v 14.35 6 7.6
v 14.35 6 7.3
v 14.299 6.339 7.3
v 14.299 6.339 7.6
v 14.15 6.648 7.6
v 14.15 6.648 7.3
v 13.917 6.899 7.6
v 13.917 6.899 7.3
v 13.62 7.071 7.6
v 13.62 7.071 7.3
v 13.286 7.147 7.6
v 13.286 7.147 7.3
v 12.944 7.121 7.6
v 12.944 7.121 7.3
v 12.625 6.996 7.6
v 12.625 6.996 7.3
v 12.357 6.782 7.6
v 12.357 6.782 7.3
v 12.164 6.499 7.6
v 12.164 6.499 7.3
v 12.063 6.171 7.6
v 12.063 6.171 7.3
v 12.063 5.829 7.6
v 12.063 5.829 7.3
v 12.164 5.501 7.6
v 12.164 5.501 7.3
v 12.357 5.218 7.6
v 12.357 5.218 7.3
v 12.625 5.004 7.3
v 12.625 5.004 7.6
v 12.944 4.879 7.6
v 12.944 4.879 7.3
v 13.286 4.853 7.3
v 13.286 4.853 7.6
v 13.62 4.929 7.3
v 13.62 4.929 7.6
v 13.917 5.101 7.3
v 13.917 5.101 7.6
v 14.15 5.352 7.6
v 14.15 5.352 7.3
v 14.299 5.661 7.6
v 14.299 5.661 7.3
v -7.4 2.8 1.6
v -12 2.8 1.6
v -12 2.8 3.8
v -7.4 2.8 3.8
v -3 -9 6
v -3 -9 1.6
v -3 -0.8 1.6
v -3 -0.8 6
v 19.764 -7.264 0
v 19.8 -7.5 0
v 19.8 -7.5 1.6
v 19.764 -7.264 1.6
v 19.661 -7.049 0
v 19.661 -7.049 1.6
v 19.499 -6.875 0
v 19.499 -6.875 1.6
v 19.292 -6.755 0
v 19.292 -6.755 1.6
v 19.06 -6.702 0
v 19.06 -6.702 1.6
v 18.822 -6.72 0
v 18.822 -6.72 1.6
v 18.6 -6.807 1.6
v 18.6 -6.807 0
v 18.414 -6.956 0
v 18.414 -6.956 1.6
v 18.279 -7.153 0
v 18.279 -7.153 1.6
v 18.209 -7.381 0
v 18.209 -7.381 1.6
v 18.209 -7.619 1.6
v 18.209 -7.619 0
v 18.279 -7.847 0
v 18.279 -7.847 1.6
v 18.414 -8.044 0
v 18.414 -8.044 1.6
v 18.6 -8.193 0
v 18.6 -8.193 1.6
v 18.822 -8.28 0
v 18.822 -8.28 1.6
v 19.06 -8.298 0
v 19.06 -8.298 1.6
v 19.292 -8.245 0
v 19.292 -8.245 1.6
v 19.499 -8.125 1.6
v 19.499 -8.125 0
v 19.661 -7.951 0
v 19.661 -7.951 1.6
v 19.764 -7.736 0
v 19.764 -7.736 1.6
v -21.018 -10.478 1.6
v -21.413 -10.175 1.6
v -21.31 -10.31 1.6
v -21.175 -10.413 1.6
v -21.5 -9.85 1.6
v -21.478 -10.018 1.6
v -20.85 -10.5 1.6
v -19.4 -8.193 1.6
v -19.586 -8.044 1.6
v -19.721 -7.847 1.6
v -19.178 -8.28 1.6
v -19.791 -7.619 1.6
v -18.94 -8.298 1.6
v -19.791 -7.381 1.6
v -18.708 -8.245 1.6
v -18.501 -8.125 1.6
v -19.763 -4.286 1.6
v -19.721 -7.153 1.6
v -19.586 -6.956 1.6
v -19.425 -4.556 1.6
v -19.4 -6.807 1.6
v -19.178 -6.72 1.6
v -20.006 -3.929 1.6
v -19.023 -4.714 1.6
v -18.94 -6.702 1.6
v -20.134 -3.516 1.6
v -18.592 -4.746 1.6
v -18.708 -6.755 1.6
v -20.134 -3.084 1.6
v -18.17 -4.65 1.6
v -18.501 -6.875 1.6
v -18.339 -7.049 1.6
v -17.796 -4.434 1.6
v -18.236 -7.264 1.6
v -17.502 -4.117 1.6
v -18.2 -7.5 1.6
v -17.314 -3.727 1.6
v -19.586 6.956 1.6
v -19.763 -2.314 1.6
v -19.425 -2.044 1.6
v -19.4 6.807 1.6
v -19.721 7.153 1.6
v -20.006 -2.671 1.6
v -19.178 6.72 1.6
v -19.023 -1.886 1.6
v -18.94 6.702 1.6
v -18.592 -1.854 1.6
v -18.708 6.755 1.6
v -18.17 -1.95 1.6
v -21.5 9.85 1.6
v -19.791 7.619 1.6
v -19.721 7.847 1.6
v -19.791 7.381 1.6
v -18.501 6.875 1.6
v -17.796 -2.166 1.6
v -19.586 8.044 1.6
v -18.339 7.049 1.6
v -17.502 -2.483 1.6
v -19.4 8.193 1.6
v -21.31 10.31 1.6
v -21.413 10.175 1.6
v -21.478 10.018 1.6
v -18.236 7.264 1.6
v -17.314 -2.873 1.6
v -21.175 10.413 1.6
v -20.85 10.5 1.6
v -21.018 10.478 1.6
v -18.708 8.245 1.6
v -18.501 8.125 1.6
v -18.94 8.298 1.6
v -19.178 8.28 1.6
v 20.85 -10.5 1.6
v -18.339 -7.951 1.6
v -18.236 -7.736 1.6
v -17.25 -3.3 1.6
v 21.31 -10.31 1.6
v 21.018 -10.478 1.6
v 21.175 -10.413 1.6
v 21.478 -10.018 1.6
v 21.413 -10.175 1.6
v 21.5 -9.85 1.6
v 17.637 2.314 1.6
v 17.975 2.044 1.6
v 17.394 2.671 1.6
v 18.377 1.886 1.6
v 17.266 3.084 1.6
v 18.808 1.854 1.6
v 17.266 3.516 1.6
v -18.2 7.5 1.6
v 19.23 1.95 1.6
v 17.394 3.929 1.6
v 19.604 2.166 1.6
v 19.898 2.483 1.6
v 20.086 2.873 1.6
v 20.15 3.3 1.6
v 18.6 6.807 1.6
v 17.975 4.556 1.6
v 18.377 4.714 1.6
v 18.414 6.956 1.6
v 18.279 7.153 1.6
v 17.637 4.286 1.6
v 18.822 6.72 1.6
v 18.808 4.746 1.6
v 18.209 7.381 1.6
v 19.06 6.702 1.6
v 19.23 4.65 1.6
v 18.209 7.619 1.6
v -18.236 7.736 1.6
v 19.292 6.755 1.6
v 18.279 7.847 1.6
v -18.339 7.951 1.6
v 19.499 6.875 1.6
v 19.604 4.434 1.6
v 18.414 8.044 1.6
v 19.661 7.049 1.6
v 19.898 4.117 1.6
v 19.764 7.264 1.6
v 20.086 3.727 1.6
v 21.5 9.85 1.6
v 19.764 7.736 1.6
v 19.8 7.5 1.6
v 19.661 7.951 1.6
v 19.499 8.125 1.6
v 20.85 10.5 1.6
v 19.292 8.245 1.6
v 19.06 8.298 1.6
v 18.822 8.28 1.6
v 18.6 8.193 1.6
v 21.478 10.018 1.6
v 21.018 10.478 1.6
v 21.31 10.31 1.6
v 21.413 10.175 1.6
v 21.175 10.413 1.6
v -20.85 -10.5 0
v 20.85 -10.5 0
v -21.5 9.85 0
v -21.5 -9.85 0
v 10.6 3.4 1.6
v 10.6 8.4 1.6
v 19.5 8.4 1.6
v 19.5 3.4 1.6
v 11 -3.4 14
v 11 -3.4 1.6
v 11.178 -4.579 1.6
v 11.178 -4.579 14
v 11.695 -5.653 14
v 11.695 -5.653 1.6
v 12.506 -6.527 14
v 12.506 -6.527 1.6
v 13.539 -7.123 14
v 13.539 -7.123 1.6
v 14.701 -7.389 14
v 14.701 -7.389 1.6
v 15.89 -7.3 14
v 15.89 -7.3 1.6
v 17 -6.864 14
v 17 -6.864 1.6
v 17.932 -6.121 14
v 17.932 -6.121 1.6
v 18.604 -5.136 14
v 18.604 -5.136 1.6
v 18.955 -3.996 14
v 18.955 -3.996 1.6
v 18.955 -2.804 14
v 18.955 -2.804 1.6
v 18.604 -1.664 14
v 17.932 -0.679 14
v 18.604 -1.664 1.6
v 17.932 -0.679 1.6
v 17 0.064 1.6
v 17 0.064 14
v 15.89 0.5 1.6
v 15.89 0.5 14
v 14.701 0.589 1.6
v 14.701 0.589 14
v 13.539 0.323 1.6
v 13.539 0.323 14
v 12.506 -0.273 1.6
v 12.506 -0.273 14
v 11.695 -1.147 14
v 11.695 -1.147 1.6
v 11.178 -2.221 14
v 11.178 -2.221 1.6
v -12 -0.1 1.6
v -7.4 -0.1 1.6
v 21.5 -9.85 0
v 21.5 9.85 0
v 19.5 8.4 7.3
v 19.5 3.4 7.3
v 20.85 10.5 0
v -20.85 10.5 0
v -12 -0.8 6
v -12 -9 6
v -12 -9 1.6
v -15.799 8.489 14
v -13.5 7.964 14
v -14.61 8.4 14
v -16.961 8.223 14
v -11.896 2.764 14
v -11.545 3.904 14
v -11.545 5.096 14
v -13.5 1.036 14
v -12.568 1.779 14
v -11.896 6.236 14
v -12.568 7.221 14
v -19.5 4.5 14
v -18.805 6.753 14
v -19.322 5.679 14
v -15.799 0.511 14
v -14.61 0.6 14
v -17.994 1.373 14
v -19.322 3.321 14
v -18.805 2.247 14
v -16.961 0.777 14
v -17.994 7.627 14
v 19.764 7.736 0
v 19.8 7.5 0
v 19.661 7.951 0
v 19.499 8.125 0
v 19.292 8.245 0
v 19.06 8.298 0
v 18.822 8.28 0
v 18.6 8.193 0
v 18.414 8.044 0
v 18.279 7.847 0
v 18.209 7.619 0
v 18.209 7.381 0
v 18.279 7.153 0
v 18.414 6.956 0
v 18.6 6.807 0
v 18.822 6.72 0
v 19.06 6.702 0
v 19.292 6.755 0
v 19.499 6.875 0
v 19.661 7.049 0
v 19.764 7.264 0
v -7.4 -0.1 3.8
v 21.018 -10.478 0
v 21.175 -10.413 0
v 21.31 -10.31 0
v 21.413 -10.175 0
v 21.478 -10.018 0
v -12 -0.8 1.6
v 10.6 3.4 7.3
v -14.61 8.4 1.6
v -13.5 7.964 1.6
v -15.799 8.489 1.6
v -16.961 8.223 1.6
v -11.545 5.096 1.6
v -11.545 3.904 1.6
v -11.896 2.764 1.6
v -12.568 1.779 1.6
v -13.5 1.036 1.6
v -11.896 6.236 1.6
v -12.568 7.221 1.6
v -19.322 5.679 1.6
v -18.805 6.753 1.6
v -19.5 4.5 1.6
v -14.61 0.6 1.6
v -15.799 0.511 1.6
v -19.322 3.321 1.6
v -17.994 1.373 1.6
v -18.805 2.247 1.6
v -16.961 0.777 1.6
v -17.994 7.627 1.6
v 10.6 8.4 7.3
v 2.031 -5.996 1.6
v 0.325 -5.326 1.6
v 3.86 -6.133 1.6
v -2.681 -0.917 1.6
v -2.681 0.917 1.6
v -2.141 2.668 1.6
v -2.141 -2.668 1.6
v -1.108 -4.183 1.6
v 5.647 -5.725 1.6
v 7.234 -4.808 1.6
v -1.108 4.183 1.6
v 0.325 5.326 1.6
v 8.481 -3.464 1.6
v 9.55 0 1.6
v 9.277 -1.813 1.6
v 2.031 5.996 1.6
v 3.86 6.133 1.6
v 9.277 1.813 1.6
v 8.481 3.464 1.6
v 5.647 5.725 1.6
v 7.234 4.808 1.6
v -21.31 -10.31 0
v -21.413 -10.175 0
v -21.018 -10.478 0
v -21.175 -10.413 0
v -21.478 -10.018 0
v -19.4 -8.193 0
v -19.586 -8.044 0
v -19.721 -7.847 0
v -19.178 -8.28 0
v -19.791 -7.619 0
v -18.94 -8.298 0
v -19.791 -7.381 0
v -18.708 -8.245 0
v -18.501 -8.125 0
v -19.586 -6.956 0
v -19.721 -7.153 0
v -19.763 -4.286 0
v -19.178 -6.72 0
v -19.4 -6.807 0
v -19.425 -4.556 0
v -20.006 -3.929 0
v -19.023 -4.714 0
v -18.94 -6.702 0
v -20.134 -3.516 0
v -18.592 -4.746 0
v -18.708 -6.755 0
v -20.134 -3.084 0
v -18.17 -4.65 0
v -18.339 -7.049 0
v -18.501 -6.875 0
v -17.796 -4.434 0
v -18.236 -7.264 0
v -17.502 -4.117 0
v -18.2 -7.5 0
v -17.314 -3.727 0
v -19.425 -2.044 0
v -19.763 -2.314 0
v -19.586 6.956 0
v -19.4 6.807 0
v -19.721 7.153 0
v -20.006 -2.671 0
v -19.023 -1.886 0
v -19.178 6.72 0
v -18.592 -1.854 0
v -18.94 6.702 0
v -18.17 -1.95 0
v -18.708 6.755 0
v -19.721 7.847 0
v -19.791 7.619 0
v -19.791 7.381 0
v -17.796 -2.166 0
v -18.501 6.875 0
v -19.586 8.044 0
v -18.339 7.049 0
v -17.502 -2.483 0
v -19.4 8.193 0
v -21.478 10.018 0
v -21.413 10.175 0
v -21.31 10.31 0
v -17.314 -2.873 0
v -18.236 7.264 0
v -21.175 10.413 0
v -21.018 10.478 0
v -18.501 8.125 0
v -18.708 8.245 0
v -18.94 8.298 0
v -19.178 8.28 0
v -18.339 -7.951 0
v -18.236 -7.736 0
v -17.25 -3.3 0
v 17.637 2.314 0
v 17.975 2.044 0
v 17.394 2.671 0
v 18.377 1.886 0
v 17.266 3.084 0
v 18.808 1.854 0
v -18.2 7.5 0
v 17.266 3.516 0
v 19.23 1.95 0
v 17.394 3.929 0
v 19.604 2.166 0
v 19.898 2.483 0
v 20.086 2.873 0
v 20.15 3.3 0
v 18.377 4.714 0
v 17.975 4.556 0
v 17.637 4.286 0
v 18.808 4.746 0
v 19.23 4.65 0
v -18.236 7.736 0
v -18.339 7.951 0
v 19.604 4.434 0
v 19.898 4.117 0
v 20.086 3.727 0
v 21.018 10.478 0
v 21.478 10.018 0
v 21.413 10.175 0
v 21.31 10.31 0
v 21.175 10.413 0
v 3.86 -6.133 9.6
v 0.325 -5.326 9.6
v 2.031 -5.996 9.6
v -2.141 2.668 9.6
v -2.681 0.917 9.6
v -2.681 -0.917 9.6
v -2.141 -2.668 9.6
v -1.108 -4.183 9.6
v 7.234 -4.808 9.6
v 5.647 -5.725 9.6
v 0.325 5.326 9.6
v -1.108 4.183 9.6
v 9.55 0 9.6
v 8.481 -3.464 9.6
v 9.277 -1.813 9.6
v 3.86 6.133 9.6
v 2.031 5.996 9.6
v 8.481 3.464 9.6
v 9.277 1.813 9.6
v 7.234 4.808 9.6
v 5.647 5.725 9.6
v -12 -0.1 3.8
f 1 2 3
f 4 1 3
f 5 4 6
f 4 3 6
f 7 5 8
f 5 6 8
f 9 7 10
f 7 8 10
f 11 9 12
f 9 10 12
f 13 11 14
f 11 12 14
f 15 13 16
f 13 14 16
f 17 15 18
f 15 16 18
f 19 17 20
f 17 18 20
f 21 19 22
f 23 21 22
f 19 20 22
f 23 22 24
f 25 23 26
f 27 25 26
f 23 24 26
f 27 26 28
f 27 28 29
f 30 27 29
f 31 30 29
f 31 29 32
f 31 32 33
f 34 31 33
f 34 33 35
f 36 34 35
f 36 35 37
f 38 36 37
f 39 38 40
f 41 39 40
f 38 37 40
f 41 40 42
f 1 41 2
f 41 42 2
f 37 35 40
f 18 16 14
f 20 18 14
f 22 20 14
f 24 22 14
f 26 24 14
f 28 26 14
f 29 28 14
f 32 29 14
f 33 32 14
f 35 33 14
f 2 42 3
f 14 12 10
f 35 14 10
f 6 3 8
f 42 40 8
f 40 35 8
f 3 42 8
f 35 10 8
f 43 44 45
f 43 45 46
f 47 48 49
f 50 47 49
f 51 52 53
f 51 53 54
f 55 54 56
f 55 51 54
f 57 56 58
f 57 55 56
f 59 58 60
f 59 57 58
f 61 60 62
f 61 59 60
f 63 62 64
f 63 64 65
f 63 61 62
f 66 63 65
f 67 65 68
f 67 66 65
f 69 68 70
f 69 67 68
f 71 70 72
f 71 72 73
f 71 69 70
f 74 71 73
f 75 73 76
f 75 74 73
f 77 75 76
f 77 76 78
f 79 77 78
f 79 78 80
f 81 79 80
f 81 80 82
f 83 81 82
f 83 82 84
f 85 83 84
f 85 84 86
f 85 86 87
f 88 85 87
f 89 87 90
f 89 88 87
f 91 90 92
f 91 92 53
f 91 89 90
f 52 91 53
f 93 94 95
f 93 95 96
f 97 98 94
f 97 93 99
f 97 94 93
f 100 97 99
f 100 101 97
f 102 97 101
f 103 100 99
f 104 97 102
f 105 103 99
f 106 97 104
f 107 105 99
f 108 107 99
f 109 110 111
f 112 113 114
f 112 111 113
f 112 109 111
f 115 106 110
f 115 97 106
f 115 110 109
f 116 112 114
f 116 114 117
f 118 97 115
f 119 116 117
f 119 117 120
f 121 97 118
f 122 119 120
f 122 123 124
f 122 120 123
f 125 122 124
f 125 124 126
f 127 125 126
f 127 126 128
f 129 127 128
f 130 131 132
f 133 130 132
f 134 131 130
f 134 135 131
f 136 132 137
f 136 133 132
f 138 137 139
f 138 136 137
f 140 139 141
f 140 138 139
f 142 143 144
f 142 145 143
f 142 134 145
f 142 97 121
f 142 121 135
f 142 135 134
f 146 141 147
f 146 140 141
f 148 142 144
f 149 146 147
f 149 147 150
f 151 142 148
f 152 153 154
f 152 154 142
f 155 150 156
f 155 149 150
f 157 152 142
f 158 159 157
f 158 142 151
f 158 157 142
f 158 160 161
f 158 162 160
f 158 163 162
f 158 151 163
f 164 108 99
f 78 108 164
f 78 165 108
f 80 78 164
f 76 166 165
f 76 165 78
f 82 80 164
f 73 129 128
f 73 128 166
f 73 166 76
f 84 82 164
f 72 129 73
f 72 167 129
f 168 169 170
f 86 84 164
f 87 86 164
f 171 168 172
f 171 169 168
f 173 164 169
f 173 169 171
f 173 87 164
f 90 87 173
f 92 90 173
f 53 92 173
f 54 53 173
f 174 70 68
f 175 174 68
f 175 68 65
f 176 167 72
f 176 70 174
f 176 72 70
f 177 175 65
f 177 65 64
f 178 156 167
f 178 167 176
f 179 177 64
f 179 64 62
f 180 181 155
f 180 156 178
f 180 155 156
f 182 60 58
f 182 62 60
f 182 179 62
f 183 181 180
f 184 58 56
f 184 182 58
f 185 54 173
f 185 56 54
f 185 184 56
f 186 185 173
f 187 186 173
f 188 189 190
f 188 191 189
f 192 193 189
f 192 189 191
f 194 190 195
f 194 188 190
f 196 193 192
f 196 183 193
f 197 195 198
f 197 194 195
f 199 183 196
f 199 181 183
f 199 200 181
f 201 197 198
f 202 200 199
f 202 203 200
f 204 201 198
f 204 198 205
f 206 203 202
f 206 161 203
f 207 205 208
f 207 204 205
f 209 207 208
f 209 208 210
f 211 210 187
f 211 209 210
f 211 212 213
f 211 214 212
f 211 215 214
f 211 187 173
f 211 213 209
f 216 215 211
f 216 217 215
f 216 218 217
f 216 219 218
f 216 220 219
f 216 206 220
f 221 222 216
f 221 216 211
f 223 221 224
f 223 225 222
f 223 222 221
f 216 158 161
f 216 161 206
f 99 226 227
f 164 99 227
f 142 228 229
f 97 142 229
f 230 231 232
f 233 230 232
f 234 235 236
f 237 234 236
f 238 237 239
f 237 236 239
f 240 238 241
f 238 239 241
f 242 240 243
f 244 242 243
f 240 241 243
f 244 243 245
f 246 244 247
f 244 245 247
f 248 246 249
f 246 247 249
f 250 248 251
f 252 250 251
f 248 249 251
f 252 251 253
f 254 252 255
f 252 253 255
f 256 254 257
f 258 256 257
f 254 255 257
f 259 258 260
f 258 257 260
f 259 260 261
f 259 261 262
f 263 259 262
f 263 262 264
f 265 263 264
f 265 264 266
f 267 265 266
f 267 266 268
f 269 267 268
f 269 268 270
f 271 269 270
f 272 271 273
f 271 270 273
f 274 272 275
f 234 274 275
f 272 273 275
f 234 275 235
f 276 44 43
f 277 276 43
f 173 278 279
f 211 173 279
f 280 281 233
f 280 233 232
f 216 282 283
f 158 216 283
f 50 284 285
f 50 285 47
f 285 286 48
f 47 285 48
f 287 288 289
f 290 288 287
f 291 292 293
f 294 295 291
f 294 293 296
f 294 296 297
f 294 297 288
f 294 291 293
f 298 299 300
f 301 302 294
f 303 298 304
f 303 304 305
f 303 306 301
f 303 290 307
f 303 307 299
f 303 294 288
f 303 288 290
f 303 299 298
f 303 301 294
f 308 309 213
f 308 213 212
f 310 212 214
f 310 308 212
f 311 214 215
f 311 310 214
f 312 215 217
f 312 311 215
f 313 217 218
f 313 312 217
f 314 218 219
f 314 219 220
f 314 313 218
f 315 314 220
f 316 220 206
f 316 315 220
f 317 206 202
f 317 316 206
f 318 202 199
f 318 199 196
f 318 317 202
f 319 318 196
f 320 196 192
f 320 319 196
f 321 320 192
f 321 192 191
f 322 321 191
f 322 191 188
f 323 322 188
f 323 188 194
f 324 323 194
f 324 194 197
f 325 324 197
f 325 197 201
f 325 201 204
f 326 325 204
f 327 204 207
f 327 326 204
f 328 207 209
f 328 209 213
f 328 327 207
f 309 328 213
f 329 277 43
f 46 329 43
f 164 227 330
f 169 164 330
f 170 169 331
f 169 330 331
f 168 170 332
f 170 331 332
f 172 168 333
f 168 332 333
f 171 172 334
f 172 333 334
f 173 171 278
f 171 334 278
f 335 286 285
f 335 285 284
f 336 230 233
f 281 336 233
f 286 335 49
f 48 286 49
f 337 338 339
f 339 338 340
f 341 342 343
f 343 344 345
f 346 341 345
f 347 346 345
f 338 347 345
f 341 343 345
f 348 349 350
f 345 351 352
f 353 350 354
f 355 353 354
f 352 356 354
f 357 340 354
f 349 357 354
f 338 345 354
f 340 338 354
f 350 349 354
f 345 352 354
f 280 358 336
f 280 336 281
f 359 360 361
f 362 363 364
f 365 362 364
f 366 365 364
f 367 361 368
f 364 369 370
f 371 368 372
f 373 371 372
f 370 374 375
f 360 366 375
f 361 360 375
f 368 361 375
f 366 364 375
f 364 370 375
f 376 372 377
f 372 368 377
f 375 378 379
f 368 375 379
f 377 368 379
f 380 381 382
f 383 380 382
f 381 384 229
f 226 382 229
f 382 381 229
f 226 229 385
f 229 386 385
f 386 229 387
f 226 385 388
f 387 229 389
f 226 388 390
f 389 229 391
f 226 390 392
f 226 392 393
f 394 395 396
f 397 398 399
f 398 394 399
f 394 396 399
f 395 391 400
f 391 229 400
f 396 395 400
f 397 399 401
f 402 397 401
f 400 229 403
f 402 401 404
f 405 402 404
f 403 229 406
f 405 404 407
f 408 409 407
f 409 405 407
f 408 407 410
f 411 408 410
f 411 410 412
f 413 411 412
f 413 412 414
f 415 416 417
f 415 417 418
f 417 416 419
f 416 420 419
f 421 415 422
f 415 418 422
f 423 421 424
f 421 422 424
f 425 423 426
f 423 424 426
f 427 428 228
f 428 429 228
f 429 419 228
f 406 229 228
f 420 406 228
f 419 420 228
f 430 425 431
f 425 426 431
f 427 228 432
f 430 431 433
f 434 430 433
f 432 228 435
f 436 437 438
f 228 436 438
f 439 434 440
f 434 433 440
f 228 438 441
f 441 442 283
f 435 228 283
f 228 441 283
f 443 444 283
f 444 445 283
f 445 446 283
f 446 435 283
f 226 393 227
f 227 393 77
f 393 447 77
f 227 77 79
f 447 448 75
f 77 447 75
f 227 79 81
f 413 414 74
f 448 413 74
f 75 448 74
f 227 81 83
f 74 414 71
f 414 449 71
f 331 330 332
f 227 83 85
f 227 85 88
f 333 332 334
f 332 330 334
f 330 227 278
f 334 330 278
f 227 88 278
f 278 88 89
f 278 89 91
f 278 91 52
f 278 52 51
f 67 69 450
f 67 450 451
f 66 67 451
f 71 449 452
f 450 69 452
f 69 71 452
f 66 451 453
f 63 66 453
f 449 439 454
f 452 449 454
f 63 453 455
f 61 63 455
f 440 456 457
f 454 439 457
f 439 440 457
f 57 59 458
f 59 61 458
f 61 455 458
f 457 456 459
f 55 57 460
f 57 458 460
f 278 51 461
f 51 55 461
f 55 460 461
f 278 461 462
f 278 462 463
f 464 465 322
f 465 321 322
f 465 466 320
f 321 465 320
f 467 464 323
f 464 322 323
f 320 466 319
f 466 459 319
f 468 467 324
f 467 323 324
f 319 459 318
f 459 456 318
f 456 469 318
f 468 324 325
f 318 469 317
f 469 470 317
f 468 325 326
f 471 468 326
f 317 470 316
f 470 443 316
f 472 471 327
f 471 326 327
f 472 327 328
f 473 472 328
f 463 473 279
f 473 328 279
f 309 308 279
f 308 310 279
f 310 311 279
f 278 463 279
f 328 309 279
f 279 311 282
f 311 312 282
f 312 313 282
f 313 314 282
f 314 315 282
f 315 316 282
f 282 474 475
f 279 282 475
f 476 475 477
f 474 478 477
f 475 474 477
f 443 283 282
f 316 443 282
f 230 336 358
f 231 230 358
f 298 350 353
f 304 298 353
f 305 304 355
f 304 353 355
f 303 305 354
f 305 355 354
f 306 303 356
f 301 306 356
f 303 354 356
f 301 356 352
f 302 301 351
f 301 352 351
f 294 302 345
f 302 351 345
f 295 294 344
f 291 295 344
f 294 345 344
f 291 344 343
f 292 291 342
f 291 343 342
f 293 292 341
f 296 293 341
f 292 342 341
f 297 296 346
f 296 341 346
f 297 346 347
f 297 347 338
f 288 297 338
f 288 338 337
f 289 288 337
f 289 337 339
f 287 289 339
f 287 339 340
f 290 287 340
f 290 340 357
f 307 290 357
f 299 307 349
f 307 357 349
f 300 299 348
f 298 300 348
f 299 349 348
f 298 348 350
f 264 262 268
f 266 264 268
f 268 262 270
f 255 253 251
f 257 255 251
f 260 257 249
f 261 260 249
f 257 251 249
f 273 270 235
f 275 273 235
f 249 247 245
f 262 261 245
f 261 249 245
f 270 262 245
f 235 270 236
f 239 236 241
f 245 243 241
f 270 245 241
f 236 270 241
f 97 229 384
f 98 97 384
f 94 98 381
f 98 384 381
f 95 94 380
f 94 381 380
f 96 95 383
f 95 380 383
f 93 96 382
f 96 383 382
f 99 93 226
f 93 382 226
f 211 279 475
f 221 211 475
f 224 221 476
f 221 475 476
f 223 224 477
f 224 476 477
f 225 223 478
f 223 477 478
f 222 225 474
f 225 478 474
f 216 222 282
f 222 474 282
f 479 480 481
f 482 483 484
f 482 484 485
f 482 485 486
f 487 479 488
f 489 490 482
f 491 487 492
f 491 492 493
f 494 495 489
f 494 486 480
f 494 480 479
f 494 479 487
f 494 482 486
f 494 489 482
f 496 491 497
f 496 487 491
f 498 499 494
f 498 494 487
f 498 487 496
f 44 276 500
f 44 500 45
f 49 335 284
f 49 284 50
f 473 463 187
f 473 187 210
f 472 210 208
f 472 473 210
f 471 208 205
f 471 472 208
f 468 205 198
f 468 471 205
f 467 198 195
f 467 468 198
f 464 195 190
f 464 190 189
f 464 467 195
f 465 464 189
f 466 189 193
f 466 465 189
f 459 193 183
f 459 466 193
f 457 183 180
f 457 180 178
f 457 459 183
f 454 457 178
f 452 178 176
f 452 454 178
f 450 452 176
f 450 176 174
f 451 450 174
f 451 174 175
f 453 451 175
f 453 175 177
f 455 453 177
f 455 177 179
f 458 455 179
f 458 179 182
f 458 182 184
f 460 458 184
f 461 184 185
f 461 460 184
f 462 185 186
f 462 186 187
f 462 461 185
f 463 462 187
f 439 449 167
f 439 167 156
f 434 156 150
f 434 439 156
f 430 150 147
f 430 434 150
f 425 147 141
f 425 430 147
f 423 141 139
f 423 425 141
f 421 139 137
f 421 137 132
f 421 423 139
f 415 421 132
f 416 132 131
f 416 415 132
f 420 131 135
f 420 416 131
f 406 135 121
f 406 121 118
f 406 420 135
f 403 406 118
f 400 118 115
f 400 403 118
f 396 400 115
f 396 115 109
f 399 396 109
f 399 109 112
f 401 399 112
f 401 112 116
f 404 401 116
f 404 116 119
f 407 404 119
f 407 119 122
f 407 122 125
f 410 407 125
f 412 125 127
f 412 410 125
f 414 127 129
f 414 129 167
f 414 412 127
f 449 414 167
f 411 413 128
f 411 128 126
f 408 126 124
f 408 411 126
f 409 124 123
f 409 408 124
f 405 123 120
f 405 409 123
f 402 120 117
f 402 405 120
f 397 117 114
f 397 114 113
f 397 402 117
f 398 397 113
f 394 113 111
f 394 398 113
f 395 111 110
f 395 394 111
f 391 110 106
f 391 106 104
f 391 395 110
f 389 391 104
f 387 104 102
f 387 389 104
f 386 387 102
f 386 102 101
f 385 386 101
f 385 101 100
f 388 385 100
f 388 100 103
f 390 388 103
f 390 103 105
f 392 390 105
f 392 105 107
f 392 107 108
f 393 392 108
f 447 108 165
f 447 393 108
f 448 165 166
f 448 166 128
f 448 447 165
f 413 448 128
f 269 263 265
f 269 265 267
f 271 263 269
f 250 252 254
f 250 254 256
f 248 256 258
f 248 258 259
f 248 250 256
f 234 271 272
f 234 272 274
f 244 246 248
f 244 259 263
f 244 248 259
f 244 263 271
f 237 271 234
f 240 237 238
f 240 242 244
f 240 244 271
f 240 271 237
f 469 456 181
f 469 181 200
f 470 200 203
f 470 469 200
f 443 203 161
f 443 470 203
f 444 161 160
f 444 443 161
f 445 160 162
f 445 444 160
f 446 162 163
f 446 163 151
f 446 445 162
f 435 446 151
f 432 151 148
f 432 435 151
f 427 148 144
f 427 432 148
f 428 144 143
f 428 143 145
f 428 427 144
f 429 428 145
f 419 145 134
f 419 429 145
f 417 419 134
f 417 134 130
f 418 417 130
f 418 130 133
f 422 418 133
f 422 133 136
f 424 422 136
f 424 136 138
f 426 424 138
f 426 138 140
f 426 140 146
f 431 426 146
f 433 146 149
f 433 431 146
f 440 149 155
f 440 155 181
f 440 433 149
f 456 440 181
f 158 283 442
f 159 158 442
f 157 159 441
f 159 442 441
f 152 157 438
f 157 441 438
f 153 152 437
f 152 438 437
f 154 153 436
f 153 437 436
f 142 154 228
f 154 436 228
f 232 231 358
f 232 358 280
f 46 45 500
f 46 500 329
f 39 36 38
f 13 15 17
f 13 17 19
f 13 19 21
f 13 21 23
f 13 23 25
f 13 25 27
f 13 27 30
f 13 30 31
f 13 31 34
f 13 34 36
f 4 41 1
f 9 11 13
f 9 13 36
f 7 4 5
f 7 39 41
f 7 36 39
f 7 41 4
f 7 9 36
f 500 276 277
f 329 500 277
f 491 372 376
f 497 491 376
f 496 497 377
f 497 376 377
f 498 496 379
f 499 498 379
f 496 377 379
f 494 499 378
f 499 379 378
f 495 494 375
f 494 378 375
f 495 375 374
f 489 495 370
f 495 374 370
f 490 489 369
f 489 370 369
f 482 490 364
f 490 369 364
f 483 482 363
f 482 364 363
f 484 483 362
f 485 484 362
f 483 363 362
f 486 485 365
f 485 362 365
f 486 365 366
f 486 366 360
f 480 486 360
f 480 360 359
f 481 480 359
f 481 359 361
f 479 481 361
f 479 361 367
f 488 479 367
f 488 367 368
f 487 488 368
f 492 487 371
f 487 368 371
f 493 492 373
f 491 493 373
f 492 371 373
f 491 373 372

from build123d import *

# Parameters (mm, degrees)
PCB_43X21X1P6_SKETCH_R     = 0.8
PCB_43X21X1P6_SKETCH_R_2   = 1.45
PCB_43X21X1P6_DEPTH        = 1.6
LM2596S_TO263_START        = 1.6
LM2596S_TO263_SKETCH_W     = 9
LM2596S_TO263_SKETCH_H     = 8.2
LM2596S_TO263_DEPTH        = 4.4
TRIM_POT_START             = 1.6
TRIM_POT_SKETCH_W          = 8.9
TRIM_POT_SKETCH_H          = 5
TRIM_POT_DEPTH             = 5.7
TRIM_ADJUST_START          = 7.3
TRIM_ADJUST_SKETCH_R       = 1.15
TRIM_ADJUST_DEPTH          = 0.3
SHIELDED_INDUCTOR_START    = 1.6
SHIELDED_INDUCTOR_SKETCH_R = 6.15
SHIELDED_INDUCTOR_DEPTH    = 8
INPUT_CAPACITOR_START      = 1.6
INPUT_CAPACITOR_SKETCH_R   = 4
INPUT_CAPACITOR_DEPTH      = 12.4
OUTPUT_CAPACITOR_START     = 1.6
OUTPUT_CAPACITOR_SKETCH_R  = 4
OUTPUT_CAPACITOR_DEPTH     = 12.4
SCHOTTKY_DIODE_START       = 1.6
SCHOTTKY_DIODE_SKETCH_W    = 4.6
SCHOTTKY_DIODE_SKETCH_H    = 2.9
SCHOTTKY_DIODE_DEPTH       = 2.2


with BuildPart() as part:
    # PCB_43x21x1p6_Sketch → PCB_43x21x1p6 (new body)
    with BuildSketch(Plane.XY):
        with BuildLine():
            Line((-20.85, -10.5), (20.85, -10.5))
            ThreePointArc((20.85, -10.5), (21.309619408, -10.309619408), (21.5, -9.85))
            Line((21.5, -9.85), (21.5, 9.85))
            ThreePointArc((21.5, 9.85), (21.309619408, 10.309619408), (20.85, 10.5))
            Line((20.85, 10.5), (-20.85, 10.5))
            ThreePointArc((-20.85, 10.5), (-21.309619408, 10.309619408), (-21.5, 9.85))
            Line((-21.5, 9.85), (-21.5, -9.85))
            ThreePointArc((-21.5, -9.85), (-21.309619408, -10.309619408), (-20.85, -10.5))
        make_face()
        with Locations((-19, -7.5)):
            Circle(PCB_43X21X1P6_SKETCH_R, mode=Mode.SUBTRACT)
        with Locations((-19, 7.5)):
            Circle(PCB_43X21X1P6_SKETCH_R, mode=Mode.SUBTRACT)
        with Locations((19, -7.5)):
            Circle(PCB_43X21X1P6_SKETCH_R, mode=Mode.SUBTRACT)
        with Locations((19, 7.5)):
            Circle(PCB_43X21X1P6_SKETCH_R, mode=Mode.SUBTRACT)
        with Locations((-18.7, -3.3)):
            Circle(PCB_43X21X1P6_SKETCH_R_2, mode=Mode.SUBTRACT)
        with Locations((18.7, 3.3)):
            Circle(PCB_43X21X1P6_SKETCH_R_2, mode=Mode.SUBTRACT)
    extrude(amount=PCB_43X21X1P6_DEPTH)


with BuildPart() as body_2:
    # LM2596S_TO263_Sketch → LM2596S_TO263 (new body)
    with BuildSketch(Plane.XY.offset(LM2596S_TO263_START)):
        with Locations((-7.5, -4.9)):
            Rectangle(LM2596S_TO263_SKETCH_W, LM2596S_TO263_SKETCH_H)
    extrude(amount=LM2596S_TO263_DEPTH)


with BuildPart() as body_3:
    # Trim_pot_Sketch → Trim_pot (new body)
    with BuildSketch(Plane.XY.offset(TRIM_POT_START)):
        with Locations((15.05, 5.9)):
            Rectangle(TRIM_POT_SKETCH_W, TRIM_POT_SKETCH_H)
    extrude(amount=TRIM_POT_DEPTH)


with BuildPart() as body_4:
    # Trim_Adjust_Sketch → Trim_Adjust (new body)
    with BuildSketch(Plane.XY.offset(TRIM_ADJUST_START)):
        with Locations((13.2, 6)):
            Circle(TRIM_ADJUST_SKETCH_R)
    extrude(amount=TRIM_ADJUST_DEPTH)


with BuildPart() as body_5:
    # Shielded_inductor_Sketch → Shielded_inductor (new body)
    with BuildSketch(Plane.XY.offset(SHIELDED_INDUCTOR_START)):
        with Locations((3.4, 0)):
            Circle(SHIELDED_INDUCTOR_SKETCH_R)
    extrude(amount=SHIELDED_INDUCTOR_DEPTH)


with BuildPart() as body_6:
    # Input_capacitor_Sketch → Input_capacitor (new body)
    with BuildSketch(Plane.XY.offset(INPUT_CAPACITOR_START)):
        with Locations(Location((-15.5, 4.5, 0), (0, 0, 180))):
            Circle(INPUT_CAPACITOR_SKETCH_R)
    extrude(amount=INPUT_CAPACITOR_DEPTH)


with BuildPart() as body_7:
    # Output_capacitor_Sketch → Output_capacitor (new body)
    with BuildSketch(Plane.XY.offset(OUTPUT_CAPACITOR_START)):
        with Locations(Location((15, -3.4, 0), (0, 0, 180))):
            Circle(OUTPUT_CAPACITOR_SKETCH_R)
    extrude(amount=OUTPUT_CAPACITOR_DEPTH)


with BuildPart() as body_8:
    # Schottky_diode_Sketch → Schottky_diode (new body)
    with BuildSketch(Plane.XY.offset(SCHOTTKY_DIODE_START)):
        with Locations((-9.7, 1.35)):
            Rectangle(SCHOTTKY_DIODE_SKETCH_W, SCHOTTKY_DIODE_SKETCH_H)
    extrude(amount=SCHOTTKY_DIODE_DEPTH)


solid = Compound([part.part, body_2.part, body_3.part, body_4.part, body_5.part, body_6.part, body_7.part, body_8.part])
